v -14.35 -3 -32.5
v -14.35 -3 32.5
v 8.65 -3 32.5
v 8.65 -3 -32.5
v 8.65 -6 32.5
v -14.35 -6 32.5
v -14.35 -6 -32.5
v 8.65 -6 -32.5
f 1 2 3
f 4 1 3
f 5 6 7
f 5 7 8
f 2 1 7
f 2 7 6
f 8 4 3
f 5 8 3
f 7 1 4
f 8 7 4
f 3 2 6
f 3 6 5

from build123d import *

# Parameters (mm, degrees)
F0_W      = 23
F0_H      = 17.5
F1_DEPTH  = 3
F2_W      = 23
F2_H      = 65
F3_DEPTH  = 3
F4_R      = 1.8275
F5_DEPTH  = 25
F4_R_2    = 1.5
F1_FACE_W = 23
F1_FACE_H = 65
F1_FACE_R = 1.8275
F6_DEPTH  = 25
F7_DEPTH  = 25


with BuildPart() as f1:
    # F0 (on Front) → F1 (new body)
    with BuildSketch(Plane.XZ):
        Polygon((-41.005974159, 32.5), (-60.6771636009, 32.5), (-60.6771636009, -32.5), (-40.7113991678, -32.5), (-14.3495606634, -32.5), (-14.3495606634, 32.5), align=None)
        Polygon((-14.3495606634, 50), (-41.005974159, 32.5), (-14.3495606634, 32.5), align=None)
        with Locations((-2.8495606634, 41.25)):
            Rectangle(F0_W, F0_H)
        Polygon((-14.3495606634, -32.5), (-40.7113991678, -32.5), (-14.3495606634, -50), align=None)
        Polygon((8.6504393366, 50), (8.6504393366, 32.5), (35.1252928376, 32.5), align=None)
        Polygon((35.1252928376, 32.5), (8.6504393366, 32.5), (8.6504393366, -32.5), (35.1984487024, -32.5), (49.3228363991, -32.5), (49.3228363991, 32.5), align=None)
        with Locations((-2.8495606634, -41.25)):
            Rectangle(F0_W, F0_H)
        Polygon((35.1984487024, -32.5), (8.6504393366, -32.5), (8.6504393366, -50), align=None)
    extrude(amount=F1_DEPTH)

    # F4 (on face) → F5 (cut)
    with BuildSketch(Plane.XZ.offset(3)):
        with Locations((15.1720186695, 41.6146814823)):
            Circle(F4_R)
    extrude(amount=-F5_DEPTH, mode=Mode.SUBTRACT)

    # F4 (on face) + F1_face (on face) → F6 (cut)
    with BuildSketch(Plane.XZ.offset(3)):
        with Locations((-15.8495606634, 41.0366989672)):
            Circle(F4_R_2)
        with Locations((15.1720186695, 41.6146814823)):
            Circle(F4_R)
    with BuildSketch(Plane(origin=(-5.5859827676, -3, 0.0100526631), x_dir=(1, 0, 0), z_dir=(0, -1, 0))):
        Polygon((-8.7635778958, -50.0100526631), (14.2364221042, -50.0100526631), (40.78443147, -32.5100526631), (54.9088191667, -32.5100526631), (54.9088191667, 32.4899473369), (40.7112756052, 32.4899473369), (14.2364221042, 49.9899473369), (-8.7635778958, 49.9899473369), (-35.4199913914, 32.4899473369), (-55.0911808333, 32.4899473369), (-55.0911808333, -32.5100526631), (-35.1254164002, -32.5100526631), align=None)
        with Locations((2.7364221042, -0.0100526631)):
            Rectangle(F1_FACE_W, F1_FACE_H, mode=Mode.SUBTRACT)
        with Locations((20.7580014371, 41.6046288192)):
            Circle(F1_FACE_R, mode=Mode.SUBTRACT)
    extrude(amount=-F6_DEPTH, mode=Mode.SUBTRACT)


with BuildPart() as f3:
    # F2 (on face) → F3 (new body)
    with BuildSketch(Plane.XZ.offset(3)):
        with Locations((-2.8495606634, 0)):
            Rectangle(F2_W, F2_H)
    extrude(amount=F3_DEPTH)

    # F4 (on face) → F7 (cut)
    with BuildSketch(Plane.XZ.offset(3)):
        with Locations((-15.8495606634, 41.0366989672)):
            Circle(F4_R_2)
        with Locations((15.1720186695, 41.6146814823)):
            Circle(F4_R)
    extrude(amount=-F7_DEPTH, mode=Mode.SUBTRACT)


solid = f3.part
